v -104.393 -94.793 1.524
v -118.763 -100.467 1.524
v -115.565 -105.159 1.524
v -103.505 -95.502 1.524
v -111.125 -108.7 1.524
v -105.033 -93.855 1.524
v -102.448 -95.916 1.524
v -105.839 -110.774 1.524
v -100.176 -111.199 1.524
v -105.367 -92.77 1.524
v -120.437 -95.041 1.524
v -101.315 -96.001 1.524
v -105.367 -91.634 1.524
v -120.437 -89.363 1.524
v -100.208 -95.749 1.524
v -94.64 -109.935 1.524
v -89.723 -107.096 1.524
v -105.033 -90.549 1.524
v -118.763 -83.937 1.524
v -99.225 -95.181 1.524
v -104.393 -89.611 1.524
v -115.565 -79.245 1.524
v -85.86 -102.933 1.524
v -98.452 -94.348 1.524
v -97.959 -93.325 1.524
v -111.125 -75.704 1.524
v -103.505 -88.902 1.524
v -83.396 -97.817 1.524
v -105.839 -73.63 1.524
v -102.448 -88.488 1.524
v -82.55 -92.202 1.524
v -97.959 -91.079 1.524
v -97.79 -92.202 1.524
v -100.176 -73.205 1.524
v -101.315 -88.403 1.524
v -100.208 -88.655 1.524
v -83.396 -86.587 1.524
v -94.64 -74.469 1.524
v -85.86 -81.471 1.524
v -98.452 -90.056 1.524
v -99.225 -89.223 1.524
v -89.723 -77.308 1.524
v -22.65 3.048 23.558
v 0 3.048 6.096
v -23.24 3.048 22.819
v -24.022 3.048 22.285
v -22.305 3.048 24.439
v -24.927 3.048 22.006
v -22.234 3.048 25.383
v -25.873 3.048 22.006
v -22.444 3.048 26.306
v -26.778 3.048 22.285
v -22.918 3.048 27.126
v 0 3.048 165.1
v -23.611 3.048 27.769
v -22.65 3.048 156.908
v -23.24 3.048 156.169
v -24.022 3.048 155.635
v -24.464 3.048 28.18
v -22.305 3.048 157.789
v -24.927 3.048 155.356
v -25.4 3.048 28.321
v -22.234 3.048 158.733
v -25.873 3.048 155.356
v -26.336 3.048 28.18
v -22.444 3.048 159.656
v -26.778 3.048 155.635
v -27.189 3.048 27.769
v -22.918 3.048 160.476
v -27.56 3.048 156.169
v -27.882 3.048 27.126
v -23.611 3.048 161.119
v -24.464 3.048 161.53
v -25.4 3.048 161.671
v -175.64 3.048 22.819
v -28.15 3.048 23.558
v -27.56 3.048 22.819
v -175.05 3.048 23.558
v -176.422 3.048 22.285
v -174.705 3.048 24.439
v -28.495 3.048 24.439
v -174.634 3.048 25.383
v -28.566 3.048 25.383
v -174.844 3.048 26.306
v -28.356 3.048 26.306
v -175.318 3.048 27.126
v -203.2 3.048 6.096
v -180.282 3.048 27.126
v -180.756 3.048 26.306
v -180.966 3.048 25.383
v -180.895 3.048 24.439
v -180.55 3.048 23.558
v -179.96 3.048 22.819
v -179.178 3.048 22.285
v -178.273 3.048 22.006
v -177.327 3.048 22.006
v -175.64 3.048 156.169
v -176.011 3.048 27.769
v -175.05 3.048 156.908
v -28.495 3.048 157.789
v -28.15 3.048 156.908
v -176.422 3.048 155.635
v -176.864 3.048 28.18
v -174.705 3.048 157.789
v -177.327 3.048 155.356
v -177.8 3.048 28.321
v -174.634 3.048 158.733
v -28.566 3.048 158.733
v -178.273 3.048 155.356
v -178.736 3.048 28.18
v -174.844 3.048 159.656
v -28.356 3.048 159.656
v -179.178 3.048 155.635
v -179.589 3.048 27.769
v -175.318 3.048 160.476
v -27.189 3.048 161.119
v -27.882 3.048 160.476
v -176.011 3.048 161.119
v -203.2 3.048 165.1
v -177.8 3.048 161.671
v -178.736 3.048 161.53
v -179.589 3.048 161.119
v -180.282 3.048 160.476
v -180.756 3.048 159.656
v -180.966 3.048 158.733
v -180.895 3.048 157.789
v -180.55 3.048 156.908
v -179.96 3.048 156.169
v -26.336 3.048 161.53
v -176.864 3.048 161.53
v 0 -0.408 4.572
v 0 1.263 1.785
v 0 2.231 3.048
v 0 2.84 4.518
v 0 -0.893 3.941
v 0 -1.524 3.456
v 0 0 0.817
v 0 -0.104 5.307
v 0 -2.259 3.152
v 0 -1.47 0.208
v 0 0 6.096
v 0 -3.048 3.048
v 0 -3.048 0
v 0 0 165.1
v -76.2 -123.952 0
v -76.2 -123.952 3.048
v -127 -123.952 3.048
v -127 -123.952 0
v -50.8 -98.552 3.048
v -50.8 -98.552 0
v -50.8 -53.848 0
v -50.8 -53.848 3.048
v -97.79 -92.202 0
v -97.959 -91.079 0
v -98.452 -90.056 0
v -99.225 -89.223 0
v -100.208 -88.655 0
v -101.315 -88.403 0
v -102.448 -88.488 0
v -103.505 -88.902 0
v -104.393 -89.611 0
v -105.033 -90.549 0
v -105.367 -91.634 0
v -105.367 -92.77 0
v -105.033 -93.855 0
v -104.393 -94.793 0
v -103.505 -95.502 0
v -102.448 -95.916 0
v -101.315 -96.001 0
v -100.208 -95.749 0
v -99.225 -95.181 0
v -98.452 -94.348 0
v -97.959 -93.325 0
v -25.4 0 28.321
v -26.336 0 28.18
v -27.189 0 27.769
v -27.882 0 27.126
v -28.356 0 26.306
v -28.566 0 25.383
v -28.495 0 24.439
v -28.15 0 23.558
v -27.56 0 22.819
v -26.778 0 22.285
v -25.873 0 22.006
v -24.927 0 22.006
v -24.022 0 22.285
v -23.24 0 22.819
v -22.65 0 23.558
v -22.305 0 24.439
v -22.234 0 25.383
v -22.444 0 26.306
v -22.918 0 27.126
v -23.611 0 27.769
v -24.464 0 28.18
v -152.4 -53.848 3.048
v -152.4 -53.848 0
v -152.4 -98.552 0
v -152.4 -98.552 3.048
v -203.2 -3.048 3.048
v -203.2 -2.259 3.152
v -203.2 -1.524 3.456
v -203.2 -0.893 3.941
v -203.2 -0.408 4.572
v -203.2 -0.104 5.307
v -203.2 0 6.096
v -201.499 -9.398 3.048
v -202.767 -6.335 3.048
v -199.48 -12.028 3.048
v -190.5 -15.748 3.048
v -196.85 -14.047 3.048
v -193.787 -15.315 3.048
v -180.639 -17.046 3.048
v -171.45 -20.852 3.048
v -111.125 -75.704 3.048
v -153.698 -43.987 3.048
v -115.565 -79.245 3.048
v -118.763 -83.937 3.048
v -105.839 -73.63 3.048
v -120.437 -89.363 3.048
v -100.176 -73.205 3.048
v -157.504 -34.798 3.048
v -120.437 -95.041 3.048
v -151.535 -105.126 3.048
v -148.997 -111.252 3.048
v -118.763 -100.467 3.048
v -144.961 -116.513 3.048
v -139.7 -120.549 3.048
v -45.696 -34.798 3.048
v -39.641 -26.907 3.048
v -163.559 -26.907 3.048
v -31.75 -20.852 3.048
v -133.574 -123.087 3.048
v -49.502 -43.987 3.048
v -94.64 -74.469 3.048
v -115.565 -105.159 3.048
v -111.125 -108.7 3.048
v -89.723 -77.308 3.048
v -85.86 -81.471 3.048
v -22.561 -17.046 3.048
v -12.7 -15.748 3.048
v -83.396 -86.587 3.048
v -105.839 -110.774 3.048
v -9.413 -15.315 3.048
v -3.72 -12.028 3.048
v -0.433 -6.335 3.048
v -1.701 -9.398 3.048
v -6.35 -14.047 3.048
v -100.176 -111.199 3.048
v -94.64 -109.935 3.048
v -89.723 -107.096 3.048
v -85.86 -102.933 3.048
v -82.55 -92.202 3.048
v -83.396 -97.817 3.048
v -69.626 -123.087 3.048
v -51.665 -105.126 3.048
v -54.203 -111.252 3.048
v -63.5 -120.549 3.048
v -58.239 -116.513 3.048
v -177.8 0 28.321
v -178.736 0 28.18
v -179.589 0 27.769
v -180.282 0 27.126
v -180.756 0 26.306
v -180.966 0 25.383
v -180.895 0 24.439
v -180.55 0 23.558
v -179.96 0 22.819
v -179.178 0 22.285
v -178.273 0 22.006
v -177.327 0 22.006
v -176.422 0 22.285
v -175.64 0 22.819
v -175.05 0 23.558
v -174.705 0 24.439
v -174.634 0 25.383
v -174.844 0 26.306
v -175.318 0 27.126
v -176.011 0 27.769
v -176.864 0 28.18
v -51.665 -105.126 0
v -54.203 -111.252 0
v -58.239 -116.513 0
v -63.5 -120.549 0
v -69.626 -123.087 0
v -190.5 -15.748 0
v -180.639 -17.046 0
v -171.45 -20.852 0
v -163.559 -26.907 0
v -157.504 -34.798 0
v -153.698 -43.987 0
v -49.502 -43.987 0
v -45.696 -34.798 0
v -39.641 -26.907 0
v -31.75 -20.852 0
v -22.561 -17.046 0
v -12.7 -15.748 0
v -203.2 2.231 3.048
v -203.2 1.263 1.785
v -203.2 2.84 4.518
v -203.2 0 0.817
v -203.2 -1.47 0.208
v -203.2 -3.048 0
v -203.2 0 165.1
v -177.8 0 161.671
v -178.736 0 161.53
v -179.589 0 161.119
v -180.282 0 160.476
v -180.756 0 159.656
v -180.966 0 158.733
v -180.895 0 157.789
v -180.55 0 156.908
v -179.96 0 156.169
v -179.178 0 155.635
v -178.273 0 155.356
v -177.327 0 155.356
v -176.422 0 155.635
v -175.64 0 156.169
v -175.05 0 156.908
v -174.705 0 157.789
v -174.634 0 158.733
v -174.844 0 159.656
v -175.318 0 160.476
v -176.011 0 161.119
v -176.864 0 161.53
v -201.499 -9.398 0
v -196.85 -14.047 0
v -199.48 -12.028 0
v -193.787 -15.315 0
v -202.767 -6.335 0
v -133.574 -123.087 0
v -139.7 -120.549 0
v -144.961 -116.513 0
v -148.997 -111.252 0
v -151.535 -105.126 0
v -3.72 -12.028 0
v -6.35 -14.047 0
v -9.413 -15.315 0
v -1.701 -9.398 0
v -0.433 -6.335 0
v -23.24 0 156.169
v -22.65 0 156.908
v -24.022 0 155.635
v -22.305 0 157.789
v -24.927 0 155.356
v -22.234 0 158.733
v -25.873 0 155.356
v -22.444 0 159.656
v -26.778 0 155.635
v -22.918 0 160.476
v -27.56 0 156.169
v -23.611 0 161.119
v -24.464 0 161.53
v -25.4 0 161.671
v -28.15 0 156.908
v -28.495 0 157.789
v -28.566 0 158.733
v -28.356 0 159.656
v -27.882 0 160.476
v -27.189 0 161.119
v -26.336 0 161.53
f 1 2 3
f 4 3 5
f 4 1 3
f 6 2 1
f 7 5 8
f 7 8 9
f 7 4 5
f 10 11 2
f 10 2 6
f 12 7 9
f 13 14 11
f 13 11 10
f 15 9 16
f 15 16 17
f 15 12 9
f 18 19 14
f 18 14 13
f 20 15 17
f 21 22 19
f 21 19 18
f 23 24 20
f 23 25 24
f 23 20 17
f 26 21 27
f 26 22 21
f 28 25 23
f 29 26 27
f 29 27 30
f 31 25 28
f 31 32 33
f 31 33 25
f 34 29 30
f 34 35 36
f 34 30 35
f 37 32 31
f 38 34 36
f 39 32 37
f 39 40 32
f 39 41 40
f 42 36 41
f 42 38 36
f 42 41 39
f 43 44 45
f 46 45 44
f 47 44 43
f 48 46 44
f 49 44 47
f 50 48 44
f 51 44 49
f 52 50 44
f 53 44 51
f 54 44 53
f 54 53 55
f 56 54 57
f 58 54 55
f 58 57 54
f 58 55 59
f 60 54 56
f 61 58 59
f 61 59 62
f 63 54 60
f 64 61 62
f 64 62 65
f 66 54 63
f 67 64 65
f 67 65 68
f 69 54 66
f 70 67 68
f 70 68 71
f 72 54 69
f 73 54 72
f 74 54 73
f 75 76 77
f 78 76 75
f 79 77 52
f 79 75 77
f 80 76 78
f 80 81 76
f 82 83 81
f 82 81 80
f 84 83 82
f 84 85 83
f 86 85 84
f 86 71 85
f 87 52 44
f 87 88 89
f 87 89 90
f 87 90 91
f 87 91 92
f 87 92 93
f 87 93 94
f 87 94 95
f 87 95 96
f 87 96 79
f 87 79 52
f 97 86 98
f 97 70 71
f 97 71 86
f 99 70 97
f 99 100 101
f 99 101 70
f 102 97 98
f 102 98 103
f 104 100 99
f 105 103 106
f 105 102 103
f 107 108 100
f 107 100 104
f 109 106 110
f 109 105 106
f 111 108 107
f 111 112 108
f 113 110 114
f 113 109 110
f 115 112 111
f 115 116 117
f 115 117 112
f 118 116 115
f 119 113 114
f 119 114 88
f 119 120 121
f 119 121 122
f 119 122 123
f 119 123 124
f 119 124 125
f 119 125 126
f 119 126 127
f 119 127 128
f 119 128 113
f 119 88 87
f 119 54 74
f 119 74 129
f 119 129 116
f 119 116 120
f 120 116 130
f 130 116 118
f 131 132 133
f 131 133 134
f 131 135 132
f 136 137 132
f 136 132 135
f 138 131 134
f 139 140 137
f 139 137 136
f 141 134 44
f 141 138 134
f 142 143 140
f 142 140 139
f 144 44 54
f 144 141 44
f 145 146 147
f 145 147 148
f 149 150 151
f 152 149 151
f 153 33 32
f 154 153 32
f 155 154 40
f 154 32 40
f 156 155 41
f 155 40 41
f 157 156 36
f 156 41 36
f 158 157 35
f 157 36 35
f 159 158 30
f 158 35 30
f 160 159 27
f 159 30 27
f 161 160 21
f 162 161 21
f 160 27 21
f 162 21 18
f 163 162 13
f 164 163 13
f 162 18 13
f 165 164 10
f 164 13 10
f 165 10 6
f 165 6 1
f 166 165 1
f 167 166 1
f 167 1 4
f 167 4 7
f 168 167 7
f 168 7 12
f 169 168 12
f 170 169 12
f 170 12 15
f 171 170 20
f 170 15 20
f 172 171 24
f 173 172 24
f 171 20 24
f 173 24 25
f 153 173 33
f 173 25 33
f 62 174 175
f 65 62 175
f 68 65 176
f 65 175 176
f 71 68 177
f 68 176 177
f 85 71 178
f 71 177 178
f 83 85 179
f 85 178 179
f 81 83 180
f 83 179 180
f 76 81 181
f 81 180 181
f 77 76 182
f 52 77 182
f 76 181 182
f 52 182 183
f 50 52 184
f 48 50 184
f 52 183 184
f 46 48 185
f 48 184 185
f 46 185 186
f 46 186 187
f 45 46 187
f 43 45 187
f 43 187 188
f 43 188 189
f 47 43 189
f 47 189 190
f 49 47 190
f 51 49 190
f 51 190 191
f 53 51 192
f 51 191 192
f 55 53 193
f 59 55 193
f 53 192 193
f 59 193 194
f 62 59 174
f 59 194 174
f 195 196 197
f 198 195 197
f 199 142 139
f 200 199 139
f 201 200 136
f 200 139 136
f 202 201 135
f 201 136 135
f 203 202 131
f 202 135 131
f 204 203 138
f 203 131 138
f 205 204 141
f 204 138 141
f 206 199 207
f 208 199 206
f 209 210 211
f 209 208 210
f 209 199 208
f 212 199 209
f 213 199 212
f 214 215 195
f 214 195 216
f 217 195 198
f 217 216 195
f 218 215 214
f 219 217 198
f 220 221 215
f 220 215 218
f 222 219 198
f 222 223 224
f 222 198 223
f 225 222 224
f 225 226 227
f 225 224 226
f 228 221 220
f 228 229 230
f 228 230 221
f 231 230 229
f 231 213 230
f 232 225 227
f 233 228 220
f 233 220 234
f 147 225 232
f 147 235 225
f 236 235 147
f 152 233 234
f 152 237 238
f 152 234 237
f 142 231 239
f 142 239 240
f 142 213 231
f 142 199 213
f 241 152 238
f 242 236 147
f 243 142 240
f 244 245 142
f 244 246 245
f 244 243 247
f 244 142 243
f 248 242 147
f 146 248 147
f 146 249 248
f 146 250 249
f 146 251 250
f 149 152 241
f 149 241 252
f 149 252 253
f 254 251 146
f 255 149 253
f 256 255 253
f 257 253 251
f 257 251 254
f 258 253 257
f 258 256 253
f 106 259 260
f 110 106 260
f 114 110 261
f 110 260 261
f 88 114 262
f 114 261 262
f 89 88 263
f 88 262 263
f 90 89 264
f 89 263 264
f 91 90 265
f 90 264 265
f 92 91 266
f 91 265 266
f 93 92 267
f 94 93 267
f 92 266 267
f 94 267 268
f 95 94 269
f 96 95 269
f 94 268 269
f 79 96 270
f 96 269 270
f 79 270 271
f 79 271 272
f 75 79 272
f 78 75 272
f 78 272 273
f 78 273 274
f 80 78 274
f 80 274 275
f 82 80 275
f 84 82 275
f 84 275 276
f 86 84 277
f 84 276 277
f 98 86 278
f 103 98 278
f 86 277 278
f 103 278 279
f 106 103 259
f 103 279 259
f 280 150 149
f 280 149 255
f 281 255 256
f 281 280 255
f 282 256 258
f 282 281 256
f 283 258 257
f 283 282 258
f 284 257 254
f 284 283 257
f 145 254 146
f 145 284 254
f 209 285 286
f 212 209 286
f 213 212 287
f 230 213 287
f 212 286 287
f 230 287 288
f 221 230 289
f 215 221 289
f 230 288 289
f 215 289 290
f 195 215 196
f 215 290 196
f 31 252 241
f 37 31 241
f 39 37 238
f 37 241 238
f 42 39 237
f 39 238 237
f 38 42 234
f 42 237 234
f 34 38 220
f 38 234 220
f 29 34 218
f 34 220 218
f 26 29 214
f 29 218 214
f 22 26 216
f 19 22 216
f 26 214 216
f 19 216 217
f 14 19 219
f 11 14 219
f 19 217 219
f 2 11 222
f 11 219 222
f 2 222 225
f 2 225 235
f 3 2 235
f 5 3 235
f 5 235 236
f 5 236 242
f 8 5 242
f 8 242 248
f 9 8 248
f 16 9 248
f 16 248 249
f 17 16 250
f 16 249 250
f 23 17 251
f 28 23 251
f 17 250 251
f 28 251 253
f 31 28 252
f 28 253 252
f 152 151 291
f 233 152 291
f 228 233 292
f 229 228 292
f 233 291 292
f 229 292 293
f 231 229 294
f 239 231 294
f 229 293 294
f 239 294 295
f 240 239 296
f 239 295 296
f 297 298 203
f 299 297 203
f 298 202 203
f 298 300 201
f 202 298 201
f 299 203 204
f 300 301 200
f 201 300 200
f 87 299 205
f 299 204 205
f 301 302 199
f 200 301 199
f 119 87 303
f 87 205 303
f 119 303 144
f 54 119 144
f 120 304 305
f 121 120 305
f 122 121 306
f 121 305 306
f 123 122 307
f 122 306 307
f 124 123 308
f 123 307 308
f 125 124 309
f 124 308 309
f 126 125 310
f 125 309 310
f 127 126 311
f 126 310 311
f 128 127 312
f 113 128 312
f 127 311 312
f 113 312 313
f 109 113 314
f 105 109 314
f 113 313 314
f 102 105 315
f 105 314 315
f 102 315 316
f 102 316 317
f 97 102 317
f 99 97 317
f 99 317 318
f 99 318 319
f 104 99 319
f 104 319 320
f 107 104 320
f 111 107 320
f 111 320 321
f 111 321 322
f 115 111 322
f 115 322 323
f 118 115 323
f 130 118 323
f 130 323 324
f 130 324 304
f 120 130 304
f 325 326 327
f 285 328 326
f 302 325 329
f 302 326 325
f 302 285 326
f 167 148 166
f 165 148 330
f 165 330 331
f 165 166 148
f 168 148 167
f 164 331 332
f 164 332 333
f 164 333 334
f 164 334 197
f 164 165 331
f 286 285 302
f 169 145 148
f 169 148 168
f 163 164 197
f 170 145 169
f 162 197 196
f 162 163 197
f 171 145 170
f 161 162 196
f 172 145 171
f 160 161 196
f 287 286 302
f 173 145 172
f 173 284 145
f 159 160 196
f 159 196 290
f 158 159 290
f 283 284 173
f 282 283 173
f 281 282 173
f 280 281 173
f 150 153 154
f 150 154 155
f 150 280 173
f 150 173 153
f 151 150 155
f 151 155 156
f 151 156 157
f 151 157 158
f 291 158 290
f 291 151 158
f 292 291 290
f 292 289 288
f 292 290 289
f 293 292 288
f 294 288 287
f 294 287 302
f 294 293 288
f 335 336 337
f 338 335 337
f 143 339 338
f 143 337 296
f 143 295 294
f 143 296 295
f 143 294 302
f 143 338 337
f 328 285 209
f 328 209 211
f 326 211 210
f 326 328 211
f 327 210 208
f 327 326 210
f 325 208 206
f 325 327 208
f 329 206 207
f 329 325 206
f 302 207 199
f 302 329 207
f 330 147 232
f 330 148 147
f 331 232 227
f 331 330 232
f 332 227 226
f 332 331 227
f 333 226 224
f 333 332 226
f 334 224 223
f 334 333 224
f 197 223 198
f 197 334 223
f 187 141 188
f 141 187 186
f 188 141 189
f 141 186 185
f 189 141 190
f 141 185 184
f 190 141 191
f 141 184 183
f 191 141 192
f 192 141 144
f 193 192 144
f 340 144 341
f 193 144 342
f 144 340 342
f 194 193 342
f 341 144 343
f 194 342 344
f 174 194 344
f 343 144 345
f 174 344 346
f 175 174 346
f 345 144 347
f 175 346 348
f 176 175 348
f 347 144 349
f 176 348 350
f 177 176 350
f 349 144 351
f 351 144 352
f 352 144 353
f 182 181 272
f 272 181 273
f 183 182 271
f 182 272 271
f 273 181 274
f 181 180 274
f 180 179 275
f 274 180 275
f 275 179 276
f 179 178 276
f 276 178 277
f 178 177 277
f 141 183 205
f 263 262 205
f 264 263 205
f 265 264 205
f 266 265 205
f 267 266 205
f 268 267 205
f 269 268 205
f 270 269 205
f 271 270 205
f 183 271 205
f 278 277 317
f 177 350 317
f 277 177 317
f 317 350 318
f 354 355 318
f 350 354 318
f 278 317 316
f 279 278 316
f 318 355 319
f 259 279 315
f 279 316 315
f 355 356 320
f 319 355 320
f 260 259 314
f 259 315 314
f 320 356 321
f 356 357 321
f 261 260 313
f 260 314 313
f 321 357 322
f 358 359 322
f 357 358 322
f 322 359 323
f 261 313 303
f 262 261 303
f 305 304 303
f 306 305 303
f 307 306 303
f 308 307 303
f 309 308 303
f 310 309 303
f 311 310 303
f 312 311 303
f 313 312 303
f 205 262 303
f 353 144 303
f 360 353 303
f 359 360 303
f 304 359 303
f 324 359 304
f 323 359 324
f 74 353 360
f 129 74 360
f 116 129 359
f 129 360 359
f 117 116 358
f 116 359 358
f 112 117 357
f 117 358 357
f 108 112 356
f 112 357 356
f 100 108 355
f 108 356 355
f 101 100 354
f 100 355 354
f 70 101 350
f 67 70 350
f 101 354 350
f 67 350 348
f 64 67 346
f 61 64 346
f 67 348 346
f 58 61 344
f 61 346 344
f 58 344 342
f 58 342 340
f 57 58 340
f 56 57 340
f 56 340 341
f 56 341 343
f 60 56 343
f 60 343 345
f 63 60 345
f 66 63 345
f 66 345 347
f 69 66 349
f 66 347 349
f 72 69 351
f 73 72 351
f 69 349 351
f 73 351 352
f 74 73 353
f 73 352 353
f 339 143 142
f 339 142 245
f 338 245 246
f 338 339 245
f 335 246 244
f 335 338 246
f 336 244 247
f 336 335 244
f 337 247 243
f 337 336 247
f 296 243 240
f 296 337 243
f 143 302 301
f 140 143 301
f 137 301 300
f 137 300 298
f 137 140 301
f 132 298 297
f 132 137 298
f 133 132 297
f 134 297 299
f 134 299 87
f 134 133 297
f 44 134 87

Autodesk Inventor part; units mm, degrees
ref_plane "YZ Plane" through (0, 0, 0) normal (1, 0, 0) x (0, 1, 0)
ref_plane "XZ Plane" through (0, 0, 0) normal (0, 1, 0) x (-1, 0, 0)
ref_plane "XY Plane" through (0, 0, 0) normal (0, 0, 1) x (1, 0, 0)
sketch "Sketch1" plane through (0, 0, 0) normal (0, 1, 0) x (-1, 0, 0)
  line L0 (0, 0) -> (203.2, 0)
  line L1 (203.2, 0) -> (203.2, 165.1)
  line L2 (203.2, 165.1) -> (0, 165.1)
  line L3 (0, 165.1) -> (0, 0)
  dimension "d0" = 203.2
  dimension "d1" = 165.1
extrude "Plate2" add sketch "Sketch1" along normal blind 3.048
sketch "Sketch4" plane through (0, 3.048, 3.048) normal (0, 0, -1) x (-1, 0, 0)
  line L0 (203.2, 0) -> (0, 0)
  line L1 (0, 0) -> (0, -127)
  line L2 (0, -127) -> (203.2, -127)
  line L3 (203.2, -127) -> (203.2, 0)
edge flange "Flange1" height 127 angle 90 thickness 3.048 bend radius 3.048 thickness toward (0, 0, -1) relief straight relief width 3.048 relief depth 1.524 edges at (-101.6, 0, 0) wall of the first edge with corners at (-203.2, 3.048, 3.048) (0, 3.048, 3.048) (0, -123.952, 3.048) (-203.2, -123.952, 3.048)
bend "Bend1"
corner "Corner1"
sketch "Sketch5" plane through (0, 3.048, 0) normal (0, 1, 0) x (1, 0, 0)
  line L0 (0, -6.096) -> (-203.2, -6.096) projected
  line L1 (-203.2, -165.1) -> (-203.2, -6.096) projected
  line L2 (0, -6.096) -> (0, -165.1) projected
  point P0 (0, 0)
  point P1 (-177.8, -25.146)
  point P2 (-25.4, -25.146)
  point P3 (-25.4, -158.496)
  point P4 (-177.8, -158.496)
  dimension "d27" = 25.4
  dimension "d28" = 25.4
  dimension "d29" = 19.05
  dimension "d30" = 133.35
hole "Hole2" at (-177.8, 3.048, 25.146) at (-25.4, 3.048, 25.146) at (-25.4, 3.048, 158.496) at (-177.8, 3.048, 158.496) direction (0, -1, 0) diameter 6.35 end through all
sketch "Sketch6" plane through (0, -123.952, 0) normal (0, 0, -1) x (-1, 0, 0)
  line L0 (203.2, 120.904) -> (0, 120.904) projected
  line L1 (0, 0) -> (0, 120.904) projected
  line L2 (203.2, 0) -> (0, 0) projected
  line L3 (203.2, 120.904) -> (203.2, 0) projected
  line L4 (50.8, 120.904) -> (152.4, 120.904)
  line L5 (152.4, 70.104) -> (152.4, 25.4)
  line L6 (127, 0) -> (76.2, 0)
  line L7 (50.8, 25.4) -> (50.8, 70.104)
  arc A0 (50.8, 25.4) -> (76.2, 0) centre (76.2, 25.4) ccw
  arc A1 (127, 0) -> (152.4, 25.4) centre (127, 25.4) ccw
  line L8 (12.7, 108.204) -> (12.7, 108.204)
  line L9 (0, 0) -> (0, 108.204)
  line L10 (0, 0) -> (76.2, 0)
  line L11 (203.2, 0) -> (127, 0)
  line L12 (190.5, 108.204) -> (190.5, 108.204)
  line L13 (203.2, 108.204) -> (203.2, 0)
  arc A2 (50.8, 70.104) -> (12.7, 108.204) centre (12.7, 70.104) ccw
  arc A3 (190.5, 108.204) -> (152.4, 70.104) centre (190.5, 70.104) ccw
  line L14 (0, 120.904) -> (0, 120.904)
  line L15 (203.2, 120.904) -> (203.2, 120.904)
  arc A4 (190.5, 108.204) -> (203.2, 120.904) centre (190.5, 120.904) ccw
  arc A5 (0, 120.904) -> (12.7, 108.204) centre (12.7, 120.904) ccw
  point P0 (0, 123.952)
  point P1 (152.4, 0)
  point P2 (50.8, 0)
  dimension "d38" = 101.6
  dimension "d40" = 50.8
  dimension "d41" = 50.8
  dimension "d42" = 25.4
  dimension "d43" = 12.7
  dimension "d44" = 38.1
  dimension "d47" = 12.7
extrude "Extrusion2" cut sketch "Sketch6" against normal through all contours L3 L2 A1 L5 A3 A4 | A5 A2 L7 A0 L2 L1
sketch "Sketch8" plane through (-203.2, -3.048, 3.048) normal (0, 0, 1) x (1, 0, 0)
  line L0 (76.2, -120.904) -> (127, -120.904) projected
  line L1 (152.4, -95.504) -> (152.4, -50.8) projected
  line L2 (50.8, -50.8) -> (50.8, -95.504) projected
  circle A0 centre (101.6, -89.154) radius 19.05
  point P0 (203.2, 3.048)
  dimension "d53" = 38.1
  dimension "d54" = 50.8
  dimension "d55" = 50.8
  dimension "d56" = 31.75
extrude "Extrusion3" cut sketch "Sketch8" against normal blind 1.524
sketch "Sketch9" plane through (-101.6, -92.202, 1.524) normal (0, 0, 1) x (1, 0, 0)
  circle A0 centre (0, 0) radius 19.05 projected
  circle A1 centre (0, 0) radius 3.81
  point P0 (101.6, 92.202)
  dimension "d59" = 7.62
extrude "Extrusion4" cut sketch "Sketch9" against normal through all contours A1
equation "\"d40\" = d41"
equation "\"d17\" = BendReliefWidth"
equation "\"d18\" = BendReliefDepth"
equation "\"d19\" = MinimumRemnant"
equation "\"d20\" = BendRadius"
equation "\"d23\" = BendRadius"
equation "\"d24\" = CornerReliefSize"
equation "\"d25\" = GapSize"
equation "\"d26\" = JacobiRadiusSize"
equation "\"d54\" = d55"
equation "\"BendRadius\" = Thickness"
equation "\"BendReliefWidth\" = Thickness"
equation "\"BendReliefDepth\" = 0.5 * Thickness"
equation "\"CornerReliefSize\" = 4 * Thickness"
equation "\"MinimumRemnant\" = 2 * Thickness"
equation "\"TransitionRadius\" = BendRadius"
equation "\"JacobiRadiusSize\" = Thickness"
equation "\"GapSize\" = Thickness"
equation "\"d15\" = BendRadius"
equation "\"d16\" = BendRadius"
equation "\"Thickness\" = 3.048"
properties part number "backplate"
